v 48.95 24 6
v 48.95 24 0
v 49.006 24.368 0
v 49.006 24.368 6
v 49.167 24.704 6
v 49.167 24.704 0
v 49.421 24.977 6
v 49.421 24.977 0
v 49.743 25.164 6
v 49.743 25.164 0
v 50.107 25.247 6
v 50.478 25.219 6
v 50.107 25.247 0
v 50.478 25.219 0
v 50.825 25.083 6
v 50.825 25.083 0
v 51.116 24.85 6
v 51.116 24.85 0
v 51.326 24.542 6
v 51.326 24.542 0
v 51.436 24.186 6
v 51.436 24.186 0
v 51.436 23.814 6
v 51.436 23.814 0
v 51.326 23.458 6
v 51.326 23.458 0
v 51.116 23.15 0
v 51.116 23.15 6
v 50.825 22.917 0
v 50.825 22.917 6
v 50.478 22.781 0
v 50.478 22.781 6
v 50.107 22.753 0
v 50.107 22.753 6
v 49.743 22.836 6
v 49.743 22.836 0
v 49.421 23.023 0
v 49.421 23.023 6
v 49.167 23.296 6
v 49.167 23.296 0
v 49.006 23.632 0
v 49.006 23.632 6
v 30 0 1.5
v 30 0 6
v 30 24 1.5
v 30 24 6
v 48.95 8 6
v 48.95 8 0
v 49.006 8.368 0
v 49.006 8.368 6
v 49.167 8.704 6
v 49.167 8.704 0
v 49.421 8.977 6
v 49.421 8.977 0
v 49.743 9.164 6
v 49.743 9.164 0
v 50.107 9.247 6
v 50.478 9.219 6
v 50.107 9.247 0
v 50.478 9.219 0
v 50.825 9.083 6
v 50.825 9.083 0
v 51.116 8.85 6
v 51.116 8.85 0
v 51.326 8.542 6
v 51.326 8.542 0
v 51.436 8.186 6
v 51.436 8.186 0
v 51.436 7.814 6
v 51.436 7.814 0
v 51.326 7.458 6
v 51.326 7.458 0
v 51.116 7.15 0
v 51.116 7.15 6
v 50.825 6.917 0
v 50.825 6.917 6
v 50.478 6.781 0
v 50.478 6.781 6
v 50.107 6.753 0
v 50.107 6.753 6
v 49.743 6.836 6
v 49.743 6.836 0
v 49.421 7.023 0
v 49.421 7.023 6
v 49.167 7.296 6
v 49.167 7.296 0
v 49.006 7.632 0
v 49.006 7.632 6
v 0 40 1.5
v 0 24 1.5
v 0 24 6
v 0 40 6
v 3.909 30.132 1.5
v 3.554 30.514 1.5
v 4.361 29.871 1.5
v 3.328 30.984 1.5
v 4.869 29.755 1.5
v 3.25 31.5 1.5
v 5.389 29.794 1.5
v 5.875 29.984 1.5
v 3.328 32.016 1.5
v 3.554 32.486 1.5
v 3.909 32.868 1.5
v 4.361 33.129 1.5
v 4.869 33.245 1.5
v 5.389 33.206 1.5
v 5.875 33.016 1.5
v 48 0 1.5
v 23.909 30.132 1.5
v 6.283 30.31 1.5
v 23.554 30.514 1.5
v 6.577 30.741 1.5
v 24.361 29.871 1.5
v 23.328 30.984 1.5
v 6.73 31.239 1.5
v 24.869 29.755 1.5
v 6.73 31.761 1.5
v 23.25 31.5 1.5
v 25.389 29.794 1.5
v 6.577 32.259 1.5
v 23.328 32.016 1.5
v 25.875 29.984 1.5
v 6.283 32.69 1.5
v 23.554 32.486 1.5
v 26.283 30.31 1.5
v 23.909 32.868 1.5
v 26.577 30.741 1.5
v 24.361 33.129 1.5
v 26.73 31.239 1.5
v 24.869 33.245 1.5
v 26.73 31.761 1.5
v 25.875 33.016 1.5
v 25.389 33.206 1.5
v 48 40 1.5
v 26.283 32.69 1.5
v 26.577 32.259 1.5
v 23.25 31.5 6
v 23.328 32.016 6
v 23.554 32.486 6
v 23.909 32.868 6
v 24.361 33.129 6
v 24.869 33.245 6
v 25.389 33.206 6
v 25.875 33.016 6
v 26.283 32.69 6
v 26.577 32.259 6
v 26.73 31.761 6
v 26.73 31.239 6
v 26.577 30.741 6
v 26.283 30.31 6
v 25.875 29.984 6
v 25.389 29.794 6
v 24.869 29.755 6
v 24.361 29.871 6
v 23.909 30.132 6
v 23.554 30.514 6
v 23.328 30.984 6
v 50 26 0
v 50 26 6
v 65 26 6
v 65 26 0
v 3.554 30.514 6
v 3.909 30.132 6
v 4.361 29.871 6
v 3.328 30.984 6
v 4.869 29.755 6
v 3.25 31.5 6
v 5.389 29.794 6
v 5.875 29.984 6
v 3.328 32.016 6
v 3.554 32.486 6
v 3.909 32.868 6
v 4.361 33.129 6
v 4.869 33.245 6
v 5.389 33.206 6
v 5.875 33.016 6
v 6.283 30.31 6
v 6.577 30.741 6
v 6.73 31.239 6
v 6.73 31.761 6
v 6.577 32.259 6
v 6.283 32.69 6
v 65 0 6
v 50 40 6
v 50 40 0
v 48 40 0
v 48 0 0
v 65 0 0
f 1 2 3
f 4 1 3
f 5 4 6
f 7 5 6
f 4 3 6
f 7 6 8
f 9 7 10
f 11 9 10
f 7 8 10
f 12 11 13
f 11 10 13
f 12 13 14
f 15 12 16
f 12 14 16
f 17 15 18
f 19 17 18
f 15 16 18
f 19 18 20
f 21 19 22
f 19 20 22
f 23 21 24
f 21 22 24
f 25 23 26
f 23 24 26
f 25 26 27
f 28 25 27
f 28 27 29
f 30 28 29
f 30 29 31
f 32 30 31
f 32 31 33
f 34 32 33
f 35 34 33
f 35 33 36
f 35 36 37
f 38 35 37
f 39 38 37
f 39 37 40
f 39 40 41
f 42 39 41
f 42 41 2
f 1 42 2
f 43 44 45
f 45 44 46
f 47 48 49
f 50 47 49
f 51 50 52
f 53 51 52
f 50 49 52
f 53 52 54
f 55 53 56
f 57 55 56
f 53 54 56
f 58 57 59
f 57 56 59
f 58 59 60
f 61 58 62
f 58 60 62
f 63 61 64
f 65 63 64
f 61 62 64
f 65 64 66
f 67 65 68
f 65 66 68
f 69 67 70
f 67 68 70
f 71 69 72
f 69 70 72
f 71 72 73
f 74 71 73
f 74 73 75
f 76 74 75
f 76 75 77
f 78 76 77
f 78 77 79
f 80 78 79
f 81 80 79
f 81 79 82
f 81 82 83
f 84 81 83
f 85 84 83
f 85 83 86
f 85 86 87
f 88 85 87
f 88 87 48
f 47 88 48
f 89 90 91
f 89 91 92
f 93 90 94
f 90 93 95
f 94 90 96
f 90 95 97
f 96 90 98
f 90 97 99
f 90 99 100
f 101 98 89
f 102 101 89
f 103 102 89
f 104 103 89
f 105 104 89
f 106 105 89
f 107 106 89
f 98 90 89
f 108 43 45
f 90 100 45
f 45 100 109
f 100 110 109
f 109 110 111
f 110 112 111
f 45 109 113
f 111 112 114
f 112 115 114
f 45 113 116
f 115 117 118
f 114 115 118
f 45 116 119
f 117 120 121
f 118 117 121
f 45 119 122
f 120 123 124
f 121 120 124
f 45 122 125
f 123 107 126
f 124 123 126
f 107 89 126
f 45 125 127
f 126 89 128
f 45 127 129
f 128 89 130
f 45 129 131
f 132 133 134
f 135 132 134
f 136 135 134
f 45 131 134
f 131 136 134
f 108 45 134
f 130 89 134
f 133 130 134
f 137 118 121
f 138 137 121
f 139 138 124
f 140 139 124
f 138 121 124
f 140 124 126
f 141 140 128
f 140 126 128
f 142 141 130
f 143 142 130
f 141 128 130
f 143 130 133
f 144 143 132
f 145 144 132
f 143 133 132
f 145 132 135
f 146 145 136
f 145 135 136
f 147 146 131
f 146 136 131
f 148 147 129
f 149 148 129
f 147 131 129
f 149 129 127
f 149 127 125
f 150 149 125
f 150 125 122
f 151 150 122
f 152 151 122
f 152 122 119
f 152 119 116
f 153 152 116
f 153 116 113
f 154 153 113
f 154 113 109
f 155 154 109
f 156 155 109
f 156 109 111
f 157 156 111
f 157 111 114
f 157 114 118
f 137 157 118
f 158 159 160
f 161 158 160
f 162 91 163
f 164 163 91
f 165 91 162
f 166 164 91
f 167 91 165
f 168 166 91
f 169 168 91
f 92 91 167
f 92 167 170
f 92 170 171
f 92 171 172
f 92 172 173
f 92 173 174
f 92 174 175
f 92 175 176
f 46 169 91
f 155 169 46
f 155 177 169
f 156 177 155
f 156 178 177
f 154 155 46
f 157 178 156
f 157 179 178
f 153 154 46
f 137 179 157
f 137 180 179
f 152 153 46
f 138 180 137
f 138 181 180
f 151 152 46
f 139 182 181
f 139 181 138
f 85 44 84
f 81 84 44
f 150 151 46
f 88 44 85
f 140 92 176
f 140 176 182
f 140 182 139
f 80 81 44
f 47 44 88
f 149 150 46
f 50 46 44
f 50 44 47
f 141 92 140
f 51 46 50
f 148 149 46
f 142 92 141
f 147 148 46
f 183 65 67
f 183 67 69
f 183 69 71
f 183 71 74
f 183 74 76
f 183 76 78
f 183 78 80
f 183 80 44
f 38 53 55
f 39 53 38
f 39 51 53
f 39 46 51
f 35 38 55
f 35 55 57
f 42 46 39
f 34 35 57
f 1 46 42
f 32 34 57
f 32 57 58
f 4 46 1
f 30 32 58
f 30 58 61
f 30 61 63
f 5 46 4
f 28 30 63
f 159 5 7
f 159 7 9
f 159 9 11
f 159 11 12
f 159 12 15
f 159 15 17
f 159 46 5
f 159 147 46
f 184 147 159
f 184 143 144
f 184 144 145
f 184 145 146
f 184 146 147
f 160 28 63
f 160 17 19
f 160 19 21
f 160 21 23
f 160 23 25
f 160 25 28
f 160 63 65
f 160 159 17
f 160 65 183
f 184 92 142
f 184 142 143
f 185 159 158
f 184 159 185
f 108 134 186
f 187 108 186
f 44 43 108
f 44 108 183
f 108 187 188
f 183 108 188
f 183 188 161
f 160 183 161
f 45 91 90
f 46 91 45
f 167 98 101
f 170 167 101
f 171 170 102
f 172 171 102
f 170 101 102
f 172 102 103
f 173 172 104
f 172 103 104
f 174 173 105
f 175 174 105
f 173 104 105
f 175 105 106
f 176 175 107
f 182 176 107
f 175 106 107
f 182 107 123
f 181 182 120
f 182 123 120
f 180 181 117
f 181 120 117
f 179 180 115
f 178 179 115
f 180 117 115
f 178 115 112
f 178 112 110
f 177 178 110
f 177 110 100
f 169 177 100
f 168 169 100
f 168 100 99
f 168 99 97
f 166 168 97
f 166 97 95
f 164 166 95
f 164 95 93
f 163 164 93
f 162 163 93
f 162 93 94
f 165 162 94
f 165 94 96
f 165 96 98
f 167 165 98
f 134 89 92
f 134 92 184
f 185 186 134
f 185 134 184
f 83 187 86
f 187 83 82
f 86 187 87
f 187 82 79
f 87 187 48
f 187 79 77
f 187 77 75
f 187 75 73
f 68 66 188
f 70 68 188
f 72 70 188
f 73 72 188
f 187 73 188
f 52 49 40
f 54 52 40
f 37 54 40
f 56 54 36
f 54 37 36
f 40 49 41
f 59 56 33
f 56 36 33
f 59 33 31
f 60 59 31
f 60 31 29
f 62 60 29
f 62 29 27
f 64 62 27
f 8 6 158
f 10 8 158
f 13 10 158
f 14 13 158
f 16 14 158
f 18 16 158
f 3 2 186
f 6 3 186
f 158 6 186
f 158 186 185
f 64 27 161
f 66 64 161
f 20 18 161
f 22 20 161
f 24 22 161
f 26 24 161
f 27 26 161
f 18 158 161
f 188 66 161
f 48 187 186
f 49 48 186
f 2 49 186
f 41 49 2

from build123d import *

# Parameters (mm, degrees)
SKETCH_1_W                  = 65
SKETCH_1_H                  = 40
EXTRUDE_1_DEPTH             = 6
SKETCH_2_W                  = 48
SKETCH_2_H                  = 1.5
CUT_EXTRUDE_1_DEPTH         = 77.557168182
HOLE_WIZARD_3_5_3_5_1_D     = 3.5
HOLE_WIZARD_3_5_3_5_1_DEPTH = 10
HOLE_WIZARD_3_5_3_5_1_TIP   = 1.051506083
HOLE_WIZARD_M3_1_D          = 2.5
SKETCH_7_W                  = 30
SKETCH_7_H                  = 24
CUT_EXTRUDE_2_DEPTH         = 10
SKETCH_9_W                  = 15
SKETCH_9_H                  = 14
CUT_EXTRUDE_3_DEPTH         = 77.557168182


with BuildPart() as part:
    # 草图1 → 凸台-拉伸1 (new body)
    with BuildSketch(Plane.XY):
        with Locations((32.5, 20)):
            Rectangle(SKETCH_1_W, SKETCH_1_H)
    extrude(amount=EXTRUDE_1_DEPTH)

    # 草图2 → 切除-拉伸1 (cut, through all)
    with BuildSketch(Plane(origin=(0, 40, 0), x_dir=(1, 0, 0), z_dir=(0, 1, 0))):
        with Locations((24, -0.75)):
            Rectangle(SKETCH_2_W, SKETCH_2_H)
    extrude(amount=-CUT_EXTRUDE_1_DEPTH, mode=Mode.SUBTRACT)

    # Ø3.5 (3.5) 直径孔1
    with Locations(Plane.XY.offset(6)):
        with Locations((25, 31.5), (5, 31.5)):
            Hole(HOLE_WIZARD_3_5_3_5_1_D / 2, depth=HOLE_WIZARD_3_5_3_5_1_DEPTH)
            with Locations((0, 0, -(HOLE_WIZARD_3_5_3_5_1_DEPTH + HOLE_WIZARD_3_5_3_5_1_TIP / 2))):  # 118° drill point
                Cone(0, HOLE_WIZARD_3_5_3_5_1_D / 2, HOLE_WIZARD_3_5_3_5_1_TIP, mode=Mode.SUBTRACT)

    # M3 螺纹孔1 (through all)
    with Locations(Plane.XY.offset(6)):
        with Locations((50.2, 8), (50.2, 24)):
            Hole(HOLE_WIZARD_M3_1_D / 2)

    # 草图7 → 切除-拉伸2 (cut)
    with BuildSketch(Plane.XY.offset(6)):
        with Locations((15, 12)):
            Rectangle(SKETCH_7_W, SKETCH_7_H)
    extrude(amount=-CUT_EXTRUDE_2_DEPTH, mode=Mode.SUBTRACT)

    # 草图9 → 切除-拉伸3 (cut, through all)
    with BuildSketch(Plane.XY.offset(6)):
        with Locations((57.5, 33)):
            Rectangle(SKETCH_9_W, SKETCH_9_H)
    extrude(amount=-CUT_EXTRUDE_3_DEPTH, mode=Mode.SUBTRACT)


solid = part.part
